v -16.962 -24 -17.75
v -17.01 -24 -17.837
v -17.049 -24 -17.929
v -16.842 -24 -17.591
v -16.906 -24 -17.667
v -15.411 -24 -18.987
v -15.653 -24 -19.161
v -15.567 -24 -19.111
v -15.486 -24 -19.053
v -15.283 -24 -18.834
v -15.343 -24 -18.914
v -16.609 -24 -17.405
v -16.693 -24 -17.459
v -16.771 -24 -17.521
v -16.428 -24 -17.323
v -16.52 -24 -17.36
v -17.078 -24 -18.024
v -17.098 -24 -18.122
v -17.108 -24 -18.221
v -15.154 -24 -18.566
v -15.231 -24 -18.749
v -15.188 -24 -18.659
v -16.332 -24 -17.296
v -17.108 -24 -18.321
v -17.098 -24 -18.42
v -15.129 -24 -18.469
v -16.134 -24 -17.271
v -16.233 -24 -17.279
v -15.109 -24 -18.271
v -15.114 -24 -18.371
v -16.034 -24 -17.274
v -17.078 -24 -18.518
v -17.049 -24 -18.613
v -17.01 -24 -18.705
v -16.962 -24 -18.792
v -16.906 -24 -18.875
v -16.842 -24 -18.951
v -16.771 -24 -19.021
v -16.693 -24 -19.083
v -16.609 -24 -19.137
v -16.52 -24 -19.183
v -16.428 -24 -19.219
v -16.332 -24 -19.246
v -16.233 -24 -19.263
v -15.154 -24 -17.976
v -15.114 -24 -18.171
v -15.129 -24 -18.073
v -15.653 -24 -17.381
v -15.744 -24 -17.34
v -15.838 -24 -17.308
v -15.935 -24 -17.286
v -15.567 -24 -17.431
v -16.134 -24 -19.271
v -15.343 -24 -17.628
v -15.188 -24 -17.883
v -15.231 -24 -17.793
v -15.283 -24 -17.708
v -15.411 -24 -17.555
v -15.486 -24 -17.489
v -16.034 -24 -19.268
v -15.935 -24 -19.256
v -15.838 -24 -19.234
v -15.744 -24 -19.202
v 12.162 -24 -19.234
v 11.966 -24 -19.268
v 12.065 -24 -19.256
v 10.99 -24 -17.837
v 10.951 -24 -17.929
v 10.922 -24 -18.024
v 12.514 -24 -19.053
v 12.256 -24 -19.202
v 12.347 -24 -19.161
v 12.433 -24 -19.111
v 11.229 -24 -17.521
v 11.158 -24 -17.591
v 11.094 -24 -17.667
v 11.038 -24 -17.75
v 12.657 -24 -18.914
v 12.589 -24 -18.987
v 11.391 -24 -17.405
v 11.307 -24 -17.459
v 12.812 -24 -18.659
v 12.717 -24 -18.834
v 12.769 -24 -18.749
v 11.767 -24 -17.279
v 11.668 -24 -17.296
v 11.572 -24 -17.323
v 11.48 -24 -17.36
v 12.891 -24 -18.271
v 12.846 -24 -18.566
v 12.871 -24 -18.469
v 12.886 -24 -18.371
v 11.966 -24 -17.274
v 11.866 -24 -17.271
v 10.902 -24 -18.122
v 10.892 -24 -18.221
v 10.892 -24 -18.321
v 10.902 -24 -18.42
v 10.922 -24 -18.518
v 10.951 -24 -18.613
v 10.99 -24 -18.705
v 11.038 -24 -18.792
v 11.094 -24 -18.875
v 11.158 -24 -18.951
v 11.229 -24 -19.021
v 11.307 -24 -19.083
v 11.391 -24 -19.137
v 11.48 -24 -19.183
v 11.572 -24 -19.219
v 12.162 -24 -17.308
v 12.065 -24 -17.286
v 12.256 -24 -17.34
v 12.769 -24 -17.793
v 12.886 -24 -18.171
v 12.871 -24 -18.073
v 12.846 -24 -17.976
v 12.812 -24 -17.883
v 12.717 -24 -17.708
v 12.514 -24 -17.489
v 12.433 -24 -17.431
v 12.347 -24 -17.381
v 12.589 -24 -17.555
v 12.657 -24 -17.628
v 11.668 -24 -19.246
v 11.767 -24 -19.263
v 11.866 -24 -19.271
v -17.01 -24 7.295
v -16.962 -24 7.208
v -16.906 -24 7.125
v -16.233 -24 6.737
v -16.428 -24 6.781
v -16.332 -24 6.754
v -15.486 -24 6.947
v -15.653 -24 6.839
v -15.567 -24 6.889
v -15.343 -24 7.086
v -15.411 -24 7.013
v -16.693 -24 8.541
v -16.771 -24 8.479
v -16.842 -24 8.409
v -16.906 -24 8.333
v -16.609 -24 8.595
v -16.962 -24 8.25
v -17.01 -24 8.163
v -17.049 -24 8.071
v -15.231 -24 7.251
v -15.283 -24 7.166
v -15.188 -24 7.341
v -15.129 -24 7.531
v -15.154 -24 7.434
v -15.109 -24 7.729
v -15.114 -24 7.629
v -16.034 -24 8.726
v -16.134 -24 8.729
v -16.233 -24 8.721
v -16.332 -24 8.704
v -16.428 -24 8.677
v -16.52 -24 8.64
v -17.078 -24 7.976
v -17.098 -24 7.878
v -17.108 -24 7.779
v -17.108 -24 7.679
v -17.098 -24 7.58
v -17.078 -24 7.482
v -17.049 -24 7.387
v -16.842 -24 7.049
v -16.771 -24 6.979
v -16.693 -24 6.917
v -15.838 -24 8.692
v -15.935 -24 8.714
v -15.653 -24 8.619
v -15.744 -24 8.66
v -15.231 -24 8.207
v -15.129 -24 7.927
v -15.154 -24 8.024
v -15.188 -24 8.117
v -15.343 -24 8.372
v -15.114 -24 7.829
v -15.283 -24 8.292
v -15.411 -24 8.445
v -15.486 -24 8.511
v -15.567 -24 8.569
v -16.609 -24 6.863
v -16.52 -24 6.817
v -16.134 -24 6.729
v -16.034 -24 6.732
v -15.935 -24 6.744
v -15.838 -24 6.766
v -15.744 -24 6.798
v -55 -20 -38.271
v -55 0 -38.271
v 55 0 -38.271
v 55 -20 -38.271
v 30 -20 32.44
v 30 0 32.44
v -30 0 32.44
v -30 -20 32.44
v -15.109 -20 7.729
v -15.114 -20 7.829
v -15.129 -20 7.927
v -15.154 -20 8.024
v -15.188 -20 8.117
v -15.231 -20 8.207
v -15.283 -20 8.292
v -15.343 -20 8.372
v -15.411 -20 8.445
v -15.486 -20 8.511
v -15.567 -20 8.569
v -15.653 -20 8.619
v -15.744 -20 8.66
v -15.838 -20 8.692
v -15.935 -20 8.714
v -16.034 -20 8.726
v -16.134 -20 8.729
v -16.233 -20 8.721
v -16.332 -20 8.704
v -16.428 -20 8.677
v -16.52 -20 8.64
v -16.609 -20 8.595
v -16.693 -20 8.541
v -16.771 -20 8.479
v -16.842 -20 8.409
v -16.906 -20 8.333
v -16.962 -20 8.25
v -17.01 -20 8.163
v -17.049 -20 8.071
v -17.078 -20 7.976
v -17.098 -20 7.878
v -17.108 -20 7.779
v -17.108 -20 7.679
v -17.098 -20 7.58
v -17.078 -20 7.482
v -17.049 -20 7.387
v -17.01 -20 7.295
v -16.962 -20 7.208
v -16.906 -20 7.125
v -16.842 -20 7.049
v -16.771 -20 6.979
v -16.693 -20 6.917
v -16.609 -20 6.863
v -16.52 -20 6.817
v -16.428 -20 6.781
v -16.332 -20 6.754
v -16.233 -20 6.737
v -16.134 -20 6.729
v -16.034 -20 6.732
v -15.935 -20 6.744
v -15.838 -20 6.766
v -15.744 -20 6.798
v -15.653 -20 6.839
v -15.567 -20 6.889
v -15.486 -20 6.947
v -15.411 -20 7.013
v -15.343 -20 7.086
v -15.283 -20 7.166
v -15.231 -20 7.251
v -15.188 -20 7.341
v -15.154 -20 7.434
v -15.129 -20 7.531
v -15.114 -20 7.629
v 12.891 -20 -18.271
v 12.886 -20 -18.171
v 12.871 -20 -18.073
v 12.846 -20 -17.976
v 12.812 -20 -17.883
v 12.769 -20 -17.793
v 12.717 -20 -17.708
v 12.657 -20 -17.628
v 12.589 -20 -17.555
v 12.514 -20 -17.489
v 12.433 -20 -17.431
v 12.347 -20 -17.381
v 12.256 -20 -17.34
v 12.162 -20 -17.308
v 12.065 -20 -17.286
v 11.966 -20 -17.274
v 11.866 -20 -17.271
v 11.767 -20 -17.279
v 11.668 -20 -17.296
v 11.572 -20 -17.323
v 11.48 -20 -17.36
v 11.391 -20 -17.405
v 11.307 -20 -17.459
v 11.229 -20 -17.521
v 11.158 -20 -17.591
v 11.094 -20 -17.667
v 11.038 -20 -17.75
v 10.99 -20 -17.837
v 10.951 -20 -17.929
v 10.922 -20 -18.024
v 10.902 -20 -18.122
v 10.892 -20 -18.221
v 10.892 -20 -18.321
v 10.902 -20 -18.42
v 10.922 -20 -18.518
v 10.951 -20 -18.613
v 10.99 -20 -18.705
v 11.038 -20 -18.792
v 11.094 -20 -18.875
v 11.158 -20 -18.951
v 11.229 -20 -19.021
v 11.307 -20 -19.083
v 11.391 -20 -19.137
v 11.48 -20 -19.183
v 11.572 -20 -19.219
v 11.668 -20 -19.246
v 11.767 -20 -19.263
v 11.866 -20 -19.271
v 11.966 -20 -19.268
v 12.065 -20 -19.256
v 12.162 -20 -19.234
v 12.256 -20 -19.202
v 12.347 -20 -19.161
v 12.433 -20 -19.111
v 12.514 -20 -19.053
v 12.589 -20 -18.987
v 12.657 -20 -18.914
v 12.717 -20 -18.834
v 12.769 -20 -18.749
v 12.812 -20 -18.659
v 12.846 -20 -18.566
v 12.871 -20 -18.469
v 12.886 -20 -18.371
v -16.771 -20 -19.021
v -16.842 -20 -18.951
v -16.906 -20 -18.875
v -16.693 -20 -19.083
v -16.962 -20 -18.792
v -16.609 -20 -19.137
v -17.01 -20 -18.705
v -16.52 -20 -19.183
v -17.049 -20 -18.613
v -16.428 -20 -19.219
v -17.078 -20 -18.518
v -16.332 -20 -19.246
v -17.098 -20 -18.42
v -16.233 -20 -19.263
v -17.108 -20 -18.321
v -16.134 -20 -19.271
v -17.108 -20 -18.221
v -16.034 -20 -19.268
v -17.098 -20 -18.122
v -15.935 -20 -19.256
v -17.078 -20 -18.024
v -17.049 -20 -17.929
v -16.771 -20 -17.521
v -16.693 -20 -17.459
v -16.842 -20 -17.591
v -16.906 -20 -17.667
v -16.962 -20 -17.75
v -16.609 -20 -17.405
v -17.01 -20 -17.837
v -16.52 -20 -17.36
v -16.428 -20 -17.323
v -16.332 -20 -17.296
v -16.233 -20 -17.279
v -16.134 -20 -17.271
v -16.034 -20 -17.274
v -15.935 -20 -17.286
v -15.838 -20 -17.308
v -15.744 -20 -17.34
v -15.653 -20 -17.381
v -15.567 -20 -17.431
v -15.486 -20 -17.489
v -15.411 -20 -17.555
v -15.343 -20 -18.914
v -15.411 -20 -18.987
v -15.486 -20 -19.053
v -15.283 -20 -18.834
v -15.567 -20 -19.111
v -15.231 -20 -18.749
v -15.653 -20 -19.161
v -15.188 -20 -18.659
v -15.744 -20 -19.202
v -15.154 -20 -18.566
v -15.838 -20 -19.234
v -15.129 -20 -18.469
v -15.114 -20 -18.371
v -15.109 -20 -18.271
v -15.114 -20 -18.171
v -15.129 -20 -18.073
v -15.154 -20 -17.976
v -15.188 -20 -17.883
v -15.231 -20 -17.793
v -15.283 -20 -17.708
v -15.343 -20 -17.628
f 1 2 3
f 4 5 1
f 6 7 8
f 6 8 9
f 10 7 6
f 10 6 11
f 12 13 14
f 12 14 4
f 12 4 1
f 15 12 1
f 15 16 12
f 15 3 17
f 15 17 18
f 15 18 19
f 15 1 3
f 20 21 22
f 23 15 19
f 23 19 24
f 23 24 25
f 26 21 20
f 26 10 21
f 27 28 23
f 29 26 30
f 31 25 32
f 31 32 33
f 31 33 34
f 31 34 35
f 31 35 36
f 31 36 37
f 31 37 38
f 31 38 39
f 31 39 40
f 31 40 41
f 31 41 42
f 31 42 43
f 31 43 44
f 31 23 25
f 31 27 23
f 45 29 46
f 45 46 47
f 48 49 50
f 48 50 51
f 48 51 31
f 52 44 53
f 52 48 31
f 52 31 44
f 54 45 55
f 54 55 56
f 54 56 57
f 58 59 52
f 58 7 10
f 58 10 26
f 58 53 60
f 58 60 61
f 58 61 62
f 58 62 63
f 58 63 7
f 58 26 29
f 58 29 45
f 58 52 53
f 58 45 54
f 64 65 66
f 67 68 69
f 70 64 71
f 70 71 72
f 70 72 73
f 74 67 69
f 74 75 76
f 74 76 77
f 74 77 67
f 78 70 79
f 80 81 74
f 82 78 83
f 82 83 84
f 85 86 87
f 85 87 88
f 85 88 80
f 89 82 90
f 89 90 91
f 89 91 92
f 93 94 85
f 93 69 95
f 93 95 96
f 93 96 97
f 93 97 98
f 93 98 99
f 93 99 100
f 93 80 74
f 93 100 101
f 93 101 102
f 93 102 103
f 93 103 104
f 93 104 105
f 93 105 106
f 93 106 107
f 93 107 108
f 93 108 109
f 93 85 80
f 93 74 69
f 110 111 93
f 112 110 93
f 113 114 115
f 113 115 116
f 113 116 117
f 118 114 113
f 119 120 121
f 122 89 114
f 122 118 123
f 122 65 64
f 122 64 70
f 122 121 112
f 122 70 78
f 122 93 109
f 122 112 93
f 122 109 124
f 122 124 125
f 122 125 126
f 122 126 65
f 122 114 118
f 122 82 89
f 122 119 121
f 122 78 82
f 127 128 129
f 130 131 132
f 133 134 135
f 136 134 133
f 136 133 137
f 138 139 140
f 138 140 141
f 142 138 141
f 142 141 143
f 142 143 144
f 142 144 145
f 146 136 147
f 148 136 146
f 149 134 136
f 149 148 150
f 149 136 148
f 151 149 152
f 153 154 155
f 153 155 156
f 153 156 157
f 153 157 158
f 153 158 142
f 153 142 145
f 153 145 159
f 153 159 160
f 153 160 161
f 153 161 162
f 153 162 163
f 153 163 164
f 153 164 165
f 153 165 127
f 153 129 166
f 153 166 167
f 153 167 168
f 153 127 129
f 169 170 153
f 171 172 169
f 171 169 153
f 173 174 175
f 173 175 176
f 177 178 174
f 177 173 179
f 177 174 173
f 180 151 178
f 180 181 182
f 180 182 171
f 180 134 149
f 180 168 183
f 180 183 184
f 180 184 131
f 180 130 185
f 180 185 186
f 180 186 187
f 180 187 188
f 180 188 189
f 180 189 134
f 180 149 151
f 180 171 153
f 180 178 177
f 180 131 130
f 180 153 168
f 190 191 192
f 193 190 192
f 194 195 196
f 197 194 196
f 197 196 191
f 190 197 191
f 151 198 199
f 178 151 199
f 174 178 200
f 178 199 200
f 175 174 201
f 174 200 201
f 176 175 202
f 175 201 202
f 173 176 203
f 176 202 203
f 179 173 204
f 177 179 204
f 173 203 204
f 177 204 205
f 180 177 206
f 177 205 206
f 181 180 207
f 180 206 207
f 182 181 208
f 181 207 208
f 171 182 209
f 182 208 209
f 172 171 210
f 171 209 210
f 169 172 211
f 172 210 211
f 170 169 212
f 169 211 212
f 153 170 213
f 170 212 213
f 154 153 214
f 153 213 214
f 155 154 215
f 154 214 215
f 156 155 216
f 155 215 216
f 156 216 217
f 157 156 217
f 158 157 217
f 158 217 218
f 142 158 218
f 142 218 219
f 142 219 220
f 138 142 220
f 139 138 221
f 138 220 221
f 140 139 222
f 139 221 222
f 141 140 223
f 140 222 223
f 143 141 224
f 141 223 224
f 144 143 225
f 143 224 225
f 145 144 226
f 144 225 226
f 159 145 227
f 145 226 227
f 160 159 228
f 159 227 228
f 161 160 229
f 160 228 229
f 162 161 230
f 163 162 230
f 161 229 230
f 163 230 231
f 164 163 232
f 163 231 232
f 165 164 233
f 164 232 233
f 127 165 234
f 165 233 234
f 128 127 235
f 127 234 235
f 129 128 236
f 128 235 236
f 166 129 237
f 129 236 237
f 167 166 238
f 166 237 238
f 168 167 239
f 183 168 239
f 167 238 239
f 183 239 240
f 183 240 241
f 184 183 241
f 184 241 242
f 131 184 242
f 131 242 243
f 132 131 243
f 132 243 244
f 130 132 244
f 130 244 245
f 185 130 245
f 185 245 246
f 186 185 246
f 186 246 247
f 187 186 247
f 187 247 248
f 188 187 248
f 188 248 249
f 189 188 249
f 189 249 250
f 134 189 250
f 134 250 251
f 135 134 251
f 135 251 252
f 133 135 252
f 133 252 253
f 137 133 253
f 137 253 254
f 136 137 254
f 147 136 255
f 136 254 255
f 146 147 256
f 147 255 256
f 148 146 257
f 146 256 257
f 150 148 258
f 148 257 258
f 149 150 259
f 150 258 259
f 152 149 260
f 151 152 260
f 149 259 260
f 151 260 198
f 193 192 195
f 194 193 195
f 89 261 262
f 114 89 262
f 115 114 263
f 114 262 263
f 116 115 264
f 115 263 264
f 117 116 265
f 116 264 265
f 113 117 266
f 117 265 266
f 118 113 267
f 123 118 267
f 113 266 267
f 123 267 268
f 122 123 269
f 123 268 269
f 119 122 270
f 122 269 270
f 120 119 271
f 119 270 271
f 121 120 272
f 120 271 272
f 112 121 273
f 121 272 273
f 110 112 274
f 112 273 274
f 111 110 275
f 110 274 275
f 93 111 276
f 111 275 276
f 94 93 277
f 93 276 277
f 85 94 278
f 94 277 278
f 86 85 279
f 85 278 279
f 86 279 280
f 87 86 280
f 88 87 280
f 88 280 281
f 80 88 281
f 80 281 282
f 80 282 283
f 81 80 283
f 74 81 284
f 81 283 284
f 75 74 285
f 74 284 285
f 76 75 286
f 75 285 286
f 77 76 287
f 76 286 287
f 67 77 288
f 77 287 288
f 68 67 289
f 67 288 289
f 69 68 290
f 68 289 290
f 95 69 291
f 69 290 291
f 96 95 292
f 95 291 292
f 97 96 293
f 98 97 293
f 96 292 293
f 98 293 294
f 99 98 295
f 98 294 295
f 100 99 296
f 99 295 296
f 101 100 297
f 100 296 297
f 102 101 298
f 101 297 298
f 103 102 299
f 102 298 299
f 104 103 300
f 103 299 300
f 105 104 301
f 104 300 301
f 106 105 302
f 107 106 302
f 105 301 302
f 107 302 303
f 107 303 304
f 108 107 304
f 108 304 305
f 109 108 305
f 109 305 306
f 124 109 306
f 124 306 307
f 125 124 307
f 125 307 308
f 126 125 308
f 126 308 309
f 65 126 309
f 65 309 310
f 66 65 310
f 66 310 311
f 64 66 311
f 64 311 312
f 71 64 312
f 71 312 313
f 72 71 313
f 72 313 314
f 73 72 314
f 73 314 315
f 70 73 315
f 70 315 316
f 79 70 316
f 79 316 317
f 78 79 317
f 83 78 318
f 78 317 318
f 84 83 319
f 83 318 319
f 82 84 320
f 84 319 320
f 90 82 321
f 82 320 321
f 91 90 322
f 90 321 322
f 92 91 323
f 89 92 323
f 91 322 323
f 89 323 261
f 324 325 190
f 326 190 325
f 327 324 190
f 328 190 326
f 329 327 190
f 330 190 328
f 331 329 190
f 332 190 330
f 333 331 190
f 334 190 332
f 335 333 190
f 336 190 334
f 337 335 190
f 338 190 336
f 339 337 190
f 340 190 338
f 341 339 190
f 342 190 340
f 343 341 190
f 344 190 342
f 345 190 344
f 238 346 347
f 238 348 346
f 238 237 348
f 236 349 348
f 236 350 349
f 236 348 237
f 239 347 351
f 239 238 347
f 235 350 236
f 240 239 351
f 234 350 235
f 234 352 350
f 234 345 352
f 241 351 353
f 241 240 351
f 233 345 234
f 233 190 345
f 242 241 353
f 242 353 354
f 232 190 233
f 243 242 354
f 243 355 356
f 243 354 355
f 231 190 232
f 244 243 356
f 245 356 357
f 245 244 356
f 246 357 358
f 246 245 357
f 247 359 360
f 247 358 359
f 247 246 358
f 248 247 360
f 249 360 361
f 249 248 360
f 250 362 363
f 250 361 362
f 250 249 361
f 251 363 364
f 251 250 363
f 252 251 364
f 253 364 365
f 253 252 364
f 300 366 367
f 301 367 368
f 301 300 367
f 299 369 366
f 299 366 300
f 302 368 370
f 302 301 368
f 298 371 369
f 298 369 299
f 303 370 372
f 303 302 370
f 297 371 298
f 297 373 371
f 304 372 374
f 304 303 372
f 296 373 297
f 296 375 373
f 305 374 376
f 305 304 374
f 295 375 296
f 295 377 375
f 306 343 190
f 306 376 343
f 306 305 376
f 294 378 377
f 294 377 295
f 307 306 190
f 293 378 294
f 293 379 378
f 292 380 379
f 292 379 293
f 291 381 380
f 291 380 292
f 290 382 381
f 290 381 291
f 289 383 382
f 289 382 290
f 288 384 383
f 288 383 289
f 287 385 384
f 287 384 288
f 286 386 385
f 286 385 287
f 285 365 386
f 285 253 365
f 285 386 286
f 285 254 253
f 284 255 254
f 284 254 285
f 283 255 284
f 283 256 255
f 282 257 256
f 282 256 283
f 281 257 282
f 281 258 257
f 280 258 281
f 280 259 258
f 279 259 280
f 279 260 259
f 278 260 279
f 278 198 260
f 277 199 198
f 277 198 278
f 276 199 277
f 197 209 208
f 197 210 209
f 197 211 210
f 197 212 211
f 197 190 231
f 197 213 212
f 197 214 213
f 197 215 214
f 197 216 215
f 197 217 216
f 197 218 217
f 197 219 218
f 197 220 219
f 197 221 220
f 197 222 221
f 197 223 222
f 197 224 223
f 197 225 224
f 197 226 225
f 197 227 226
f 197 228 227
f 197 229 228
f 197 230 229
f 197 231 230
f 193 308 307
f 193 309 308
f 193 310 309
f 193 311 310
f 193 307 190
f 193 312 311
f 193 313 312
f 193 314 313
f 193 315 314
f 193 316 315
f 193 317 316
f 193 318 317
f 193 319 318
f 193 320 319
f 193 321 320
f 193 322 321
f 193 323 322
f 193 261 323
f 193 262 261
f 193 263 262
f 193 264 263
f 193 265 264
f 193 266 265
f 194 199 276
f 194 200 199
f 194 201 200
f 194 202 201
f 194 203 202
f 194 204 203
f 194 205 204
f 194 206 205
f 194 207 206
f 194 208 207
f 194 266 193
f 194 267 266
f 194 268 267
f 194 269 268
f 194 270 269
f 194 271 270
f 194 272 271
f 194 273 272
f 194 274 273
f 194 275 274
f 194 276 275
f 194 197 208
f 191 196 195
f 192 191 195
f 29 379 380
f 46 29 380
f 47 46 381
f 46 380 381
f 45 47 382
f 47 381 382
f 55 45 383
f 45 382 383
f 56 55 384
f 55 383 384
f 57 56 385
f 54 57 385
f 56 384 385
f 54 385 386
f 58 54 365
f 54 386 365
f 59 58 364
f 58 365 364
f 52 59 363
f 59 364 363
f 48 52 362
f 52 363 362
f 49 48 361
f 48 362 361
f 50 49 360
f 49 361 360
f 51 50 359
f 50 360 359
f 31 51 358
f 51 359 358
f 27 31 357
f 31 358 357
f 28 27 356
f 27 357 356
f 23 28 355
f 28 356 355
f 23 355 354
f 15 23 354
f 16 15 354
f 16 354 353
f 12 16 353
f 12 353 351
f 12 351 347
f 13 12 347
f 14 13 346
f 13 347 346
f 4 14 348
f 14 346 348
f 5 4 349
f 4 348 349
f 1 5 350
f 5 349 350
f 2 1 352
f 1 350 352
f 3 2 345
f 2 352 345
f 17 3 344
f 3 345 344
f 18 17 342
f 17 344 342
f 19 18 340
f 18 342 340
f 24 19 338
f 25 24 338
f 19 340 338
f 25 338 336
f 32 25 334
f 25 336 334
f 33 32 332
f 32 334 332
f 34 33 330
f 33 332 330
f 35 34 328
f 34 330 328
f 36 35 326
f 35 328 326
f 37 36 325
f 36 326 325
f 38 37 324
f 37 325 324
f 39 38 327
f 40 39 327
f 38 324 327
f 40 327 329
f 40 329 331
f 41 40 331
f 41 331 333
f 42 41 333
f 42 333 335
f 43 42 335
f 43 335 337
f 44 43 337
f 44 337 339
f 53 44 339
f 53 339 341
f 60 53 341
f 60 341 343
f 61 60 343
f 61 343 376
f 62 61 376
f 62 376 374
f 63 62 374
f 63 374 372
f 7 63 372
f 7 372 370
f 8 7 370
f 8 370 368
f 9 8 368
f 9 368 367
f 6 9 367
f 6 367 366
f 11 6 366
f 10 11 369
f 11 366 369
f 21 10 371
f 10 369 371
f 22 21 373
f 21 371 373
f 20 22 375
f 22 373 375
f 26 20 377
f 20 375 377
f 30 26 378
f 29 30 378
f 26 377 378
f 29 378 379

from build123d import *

# Parameters (mm, degrees)
F1_DEPTH = 20
F2_R     = 1
F3_DEPTH = 4


with BuildPart() as f1:
    # F0 (on Front) → F1 (new body)
    with BuildSketch(Plane.XZ):
        Polygon((30, 32.439652), (0, 32.439652), (-30, 32.439652), (-55, -38.271026), (0, -38.271026), (55, -38.271026), align=None)
    extrude(amount=F1_DEPTH)

    # F2 (on face) → F3 (join)
    with BuildSketch(Plane.XZ.offset(20)):
        with Locations((-16.109127, 7.728974)):
            Circle(F2_R)
        with Locations((-16.109127, -18.271026)):
            Circle(F2_R)
        with Locations((11.890873, -18.271026)):
            Circle(F2_R)
    extrude(amount=F3_DEPTH)


solid = f1.part
